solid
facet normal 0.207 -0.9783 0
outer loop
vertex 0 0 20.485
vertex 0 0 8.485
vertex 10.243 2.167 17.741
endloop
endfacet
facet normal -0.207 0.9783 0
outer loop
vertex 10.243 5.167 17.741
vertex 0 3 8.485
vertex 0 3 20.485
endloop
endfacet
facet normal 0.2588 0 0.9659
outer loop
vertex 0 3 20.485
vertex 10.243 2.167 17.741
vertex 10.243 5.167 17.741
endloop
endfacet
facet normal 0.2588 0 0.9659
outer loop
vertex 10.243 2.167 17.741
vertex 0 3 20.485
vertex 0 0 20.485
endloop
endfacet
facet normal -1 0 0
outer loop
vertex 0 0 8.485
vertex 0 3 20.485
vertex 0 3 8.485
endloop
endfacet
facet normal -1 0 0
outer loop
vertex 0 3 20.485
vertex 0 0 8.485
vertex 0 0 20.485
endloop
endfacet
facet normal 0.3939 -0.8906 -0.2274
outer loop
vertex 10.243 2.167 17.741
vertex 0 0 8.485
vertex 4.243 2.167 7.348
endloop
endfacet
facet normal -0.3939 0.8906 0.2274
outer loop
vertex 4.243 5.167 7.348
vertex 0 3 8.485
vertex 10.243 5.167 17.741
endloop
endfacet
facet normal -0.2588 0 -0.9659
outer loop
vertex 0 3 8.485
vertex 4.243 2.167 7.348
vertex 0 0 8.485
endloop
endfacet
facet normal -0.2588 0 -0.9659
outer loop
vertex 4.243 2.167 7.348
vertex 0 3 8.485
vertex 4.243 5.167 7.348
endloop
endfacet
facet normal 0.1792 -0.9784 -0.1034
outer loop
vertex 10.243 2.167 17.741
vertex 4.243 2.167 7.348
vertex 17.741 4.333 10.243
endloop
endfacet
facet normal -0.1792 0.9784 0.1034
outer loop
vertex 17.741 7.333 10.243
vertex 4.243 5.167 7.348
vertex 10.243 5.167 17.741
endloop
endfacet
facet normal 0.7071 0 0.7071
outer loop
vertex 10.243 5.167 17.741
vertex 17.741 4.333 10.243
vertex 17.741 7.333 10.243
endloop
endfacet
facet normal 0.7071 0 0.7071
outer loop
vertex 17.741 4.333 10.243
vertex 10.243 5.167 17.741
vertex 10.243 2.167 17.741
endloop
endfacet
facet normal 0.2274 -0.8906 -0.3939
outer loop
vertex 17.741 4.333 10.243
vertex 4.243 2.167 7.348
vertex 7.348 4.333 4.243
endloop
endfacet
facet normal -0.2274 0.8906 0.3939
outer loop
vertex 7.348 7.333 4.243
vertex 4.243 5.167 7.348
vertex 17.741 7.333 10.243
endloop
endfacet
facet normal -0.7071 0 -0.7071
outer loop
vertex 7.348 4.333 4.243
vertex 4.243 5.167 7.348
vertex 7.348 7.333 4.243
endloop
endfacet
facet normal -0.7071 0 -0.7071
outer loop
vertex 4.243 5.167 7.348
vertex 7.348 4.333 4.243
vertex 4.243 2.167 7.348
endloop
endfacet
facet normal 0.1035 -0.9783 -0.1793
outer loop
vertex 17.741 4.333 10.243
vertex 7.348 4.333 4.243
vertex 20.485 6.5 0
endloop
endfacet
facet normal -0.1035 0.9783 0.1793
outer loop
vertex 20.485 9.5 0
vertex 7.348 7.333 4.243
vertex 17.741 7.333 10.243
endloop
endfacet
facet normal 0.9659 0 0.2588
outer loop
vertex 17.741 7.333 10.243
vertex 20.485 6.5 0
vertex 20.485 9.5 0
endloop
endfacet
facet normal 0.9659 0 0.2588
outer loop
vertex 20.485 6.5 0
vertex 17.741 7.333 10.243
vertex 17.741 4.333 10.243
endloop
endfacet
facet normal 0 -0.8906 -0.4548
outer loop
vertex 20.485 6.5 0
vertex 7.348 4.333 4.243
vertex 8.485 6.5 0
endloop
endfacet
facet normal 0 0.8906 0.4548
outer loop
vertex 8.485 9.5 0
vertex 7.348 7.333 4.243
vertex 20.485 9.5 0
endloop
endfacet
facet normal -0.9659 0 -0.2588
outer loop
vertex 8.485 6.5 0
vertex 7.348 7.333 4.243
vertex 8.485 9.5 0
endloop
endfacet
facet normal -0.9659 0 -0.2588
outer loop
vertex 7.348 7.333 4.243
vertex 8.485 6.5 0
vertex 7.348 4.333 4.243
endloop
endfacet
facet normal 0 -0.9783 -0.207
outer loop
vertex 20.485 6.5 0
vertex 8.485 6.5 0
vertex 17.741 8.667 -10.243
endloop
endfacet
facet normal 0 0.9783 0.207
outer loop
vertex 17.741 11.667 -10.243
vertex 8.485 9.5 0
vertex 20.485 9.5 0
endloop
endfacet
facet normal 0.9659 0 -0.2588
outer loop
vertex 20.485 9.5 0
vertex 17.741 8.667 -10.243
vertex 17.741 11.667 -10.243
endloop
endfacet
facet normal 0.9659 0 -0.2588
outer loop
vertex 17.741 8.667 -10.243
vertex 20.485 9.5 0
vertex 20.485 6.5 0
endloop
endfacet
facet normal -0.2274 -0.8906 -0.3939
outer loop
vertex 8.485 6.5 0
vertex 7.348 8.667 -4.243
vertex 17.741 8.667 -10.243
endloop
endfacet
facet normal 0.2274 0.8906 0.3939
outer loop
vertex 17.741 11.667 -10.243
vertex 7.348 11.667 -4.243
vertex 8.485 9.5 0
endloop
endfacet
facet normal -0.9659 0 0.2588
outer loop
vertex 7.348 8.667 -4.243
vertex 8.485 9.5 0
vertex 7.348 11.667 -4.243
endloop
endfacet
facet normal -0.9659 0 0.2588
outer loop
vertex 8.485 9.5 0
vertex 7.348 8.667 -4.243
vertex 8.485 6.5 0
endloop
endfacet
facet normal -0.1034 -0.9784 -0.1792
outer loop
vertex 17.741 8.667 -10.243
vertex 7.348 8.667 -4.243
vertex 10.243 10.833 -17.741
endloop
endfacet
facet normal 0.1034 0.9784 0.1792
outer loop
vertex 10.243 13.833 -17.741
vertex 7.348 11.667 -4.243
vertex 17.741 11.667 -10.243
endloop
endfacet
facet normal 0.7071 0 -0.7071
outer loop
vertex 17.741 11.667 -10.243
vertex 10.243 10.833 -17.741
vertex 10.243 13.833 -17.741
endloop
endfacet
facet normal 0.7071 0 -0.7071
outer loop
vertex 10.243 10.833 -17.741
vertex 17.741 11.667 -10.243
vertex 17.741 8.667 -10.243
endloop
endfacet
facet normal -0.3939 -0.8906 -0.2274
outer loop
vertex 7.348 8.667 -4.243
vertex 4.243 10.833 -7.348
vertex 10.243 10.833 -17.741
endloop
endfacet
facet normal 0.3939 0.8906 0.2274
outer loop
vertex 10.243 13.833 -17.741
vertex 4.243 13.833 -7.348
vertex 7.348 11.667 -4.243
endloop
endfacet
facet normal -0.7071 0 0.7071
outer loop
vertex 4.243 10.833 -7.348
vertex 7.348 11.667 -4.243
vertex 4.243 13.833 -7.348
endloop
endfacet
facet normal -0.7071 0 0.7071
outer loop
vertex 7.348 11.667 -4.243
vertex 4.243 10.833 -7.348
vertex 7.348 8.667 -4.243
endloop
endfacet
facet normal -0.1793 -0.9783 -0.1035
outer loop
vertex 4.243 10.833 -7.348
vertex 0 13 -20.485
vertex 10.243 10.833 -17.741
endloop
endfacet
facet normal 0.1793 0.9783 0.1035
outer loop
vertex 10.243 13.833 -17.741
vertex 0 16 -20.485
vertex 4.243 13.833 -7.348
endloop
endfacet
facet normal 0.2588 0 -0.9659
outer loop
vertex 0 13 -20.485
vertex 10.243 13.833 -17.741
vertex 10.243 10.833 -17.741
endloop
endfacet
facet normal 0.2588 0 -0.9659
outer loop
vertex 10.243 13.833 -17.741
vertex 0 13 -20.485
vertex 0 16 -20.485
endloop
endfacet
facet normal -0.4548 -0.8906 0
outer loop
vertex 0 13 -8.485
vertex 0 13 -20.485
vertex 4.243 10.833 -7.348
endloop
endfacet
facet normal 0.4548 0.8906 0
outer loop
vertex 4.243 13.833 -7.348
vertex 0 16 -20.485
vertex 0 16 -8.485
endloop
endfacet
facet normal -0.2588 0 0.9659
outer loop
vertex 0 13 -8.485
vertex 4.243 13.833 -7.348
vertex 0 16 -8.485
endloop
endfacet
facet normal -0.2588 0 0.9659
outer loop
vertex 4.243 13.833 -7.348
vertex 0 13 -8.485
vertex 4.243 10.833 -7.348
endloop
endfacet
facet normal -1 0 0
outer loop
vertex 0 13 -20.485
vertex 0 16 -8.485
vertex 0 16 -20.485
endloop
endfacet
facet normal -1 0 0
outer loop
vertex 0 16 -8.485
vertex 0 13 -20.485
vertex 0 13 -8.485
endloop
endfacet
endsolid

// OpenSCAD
//
//
//

module spiral_ramp_section(inner_radius = 10,
                           outer_radius = 20,
                           tower_height = 20,
                           angle_start = 0,
                           angle_sweep = 20,
                           y_start = 0,
                           y_rise = 2,
                           thickness = 1,
                           part = 0)
{
    // p0 and p1 are on the right of the ramp section
    p0x = inner_radius * sin(angle_start);
    p0y = y_start;
    p0z = inner_radius * cos(angle_start);

    p1x = outer_radius * sin(angle_start);
    p1y = y_start;
    p1z = outer_radius * cos(angle_start);

    // p2 and p3 are on the left of the ramp section
    p2x = outer_radius * sin(angle_start + angle_sweep);
    p2y = y_start + y_rise;
    p2z = outer_radius * cos(angle_start + angle_sweep);

    p3x = inner_radius * sin(angle_start + angle_sweep);
    p3y = y_start + y_rise;
    p3z = inner_radius * cos(angle_start + angle_sweep);

    section_points = [[p0x, p0y, p0z], // 0
                      [p1x, p1y, p1z], // 1
                      [p2x, p2y, p2z], // 2
                      [p3x, p3y, p3z], // 3
                      [p0x, p0y + thickness, p0z], // 4
                      [p1x, p1y + thickness, p1z], // 5
                      [p2x, p2y + thickness, p2z], // 6
                      [p3x, p3y + thickness, p3z]  // 7
                      ];

    if (part == 0) {
        polyhedron(points=section_points,
                   faces=[[2, 1, 0], // bottom
                          [4, 5, 6], // top
                          [1, 2, 6, 5], // far
                          [4, 6, 2, 0], // center
                          [0, 1, 5, 4]] // right
                   );
    } else if (part == 1) {
        polyhedron(points=section_points,
                   faces=[[3, 2, 0], // bottom
                          [4, 6, 7], // top
                          [0, 4, 7, 3], // near
                          [0, 2, 6, 4], // center
                          [2, 3, 7, 6]] // left
                   );
    }
}



// these values are from tower-third-floor.scad
width = 12;
third_floor_slice_count = 8; // this indirectly controls the size of the pad
third_floor_slice_sweep = 360 / third_floor_slice_count;
third_floor_radius = (width / 2) / sin(third_floor_slice_sweep / 2);
third_floor_edge_radius = cos(third_floor_slice_sweep / 2) * third_floor_radius;


inner_radius = third_floor_edge_radius - (third_floor_radius * cos(third_floor_slice_sweep * 1.5));
outer_radius = inner_radius + width;

tower_height = 13;
thickness = 3;
angle_start = 0;
subsection_count = 4;
sections = 6;
total_angle_sweep = 180.0;
angle_sweep = total_angle_sweep / sections;
y_rise = tower_height / sections;

combined = 1; // this can be overridden by the Makefile

if (combined == 1) {
    difference() {
        for(nth=[0:1:sections*2-1]) {
            spiral_ramp_section(inner_radius = inner_radius,
                                outer_radius = outer_radius,
                                tower_height = tower_height,
                                angle_start = floor( nth / 2.0 ) * angle_sweep,
                                angle_sweep = angle_sweep,
                                y_start = floor( nth / 2.0 ) * y_rise,
                                y_rise = y_rise,
                                thickness = thickness,
                                part = nth - floor( nth / 2.0 ) * 2);
        }
    }
} else {
    // do part of one pie-slice of the tower
    spiral_ramp_section(inner_radius = inner_radius,
                        outer_radius = outer_radius,
                        tower_height = tower_height,
                        angle_start = floor( nth / 2.0 ) * angle_sweep,
                        angle_sweep = angle_sweep,
                        y_start = floor( nth / 2.0 ) * y_rise,
                        y_rise = y_rise,
                        thickness = thickness,
                        part = nth - floor( nth / 2.0 ) * 2.0);
}
